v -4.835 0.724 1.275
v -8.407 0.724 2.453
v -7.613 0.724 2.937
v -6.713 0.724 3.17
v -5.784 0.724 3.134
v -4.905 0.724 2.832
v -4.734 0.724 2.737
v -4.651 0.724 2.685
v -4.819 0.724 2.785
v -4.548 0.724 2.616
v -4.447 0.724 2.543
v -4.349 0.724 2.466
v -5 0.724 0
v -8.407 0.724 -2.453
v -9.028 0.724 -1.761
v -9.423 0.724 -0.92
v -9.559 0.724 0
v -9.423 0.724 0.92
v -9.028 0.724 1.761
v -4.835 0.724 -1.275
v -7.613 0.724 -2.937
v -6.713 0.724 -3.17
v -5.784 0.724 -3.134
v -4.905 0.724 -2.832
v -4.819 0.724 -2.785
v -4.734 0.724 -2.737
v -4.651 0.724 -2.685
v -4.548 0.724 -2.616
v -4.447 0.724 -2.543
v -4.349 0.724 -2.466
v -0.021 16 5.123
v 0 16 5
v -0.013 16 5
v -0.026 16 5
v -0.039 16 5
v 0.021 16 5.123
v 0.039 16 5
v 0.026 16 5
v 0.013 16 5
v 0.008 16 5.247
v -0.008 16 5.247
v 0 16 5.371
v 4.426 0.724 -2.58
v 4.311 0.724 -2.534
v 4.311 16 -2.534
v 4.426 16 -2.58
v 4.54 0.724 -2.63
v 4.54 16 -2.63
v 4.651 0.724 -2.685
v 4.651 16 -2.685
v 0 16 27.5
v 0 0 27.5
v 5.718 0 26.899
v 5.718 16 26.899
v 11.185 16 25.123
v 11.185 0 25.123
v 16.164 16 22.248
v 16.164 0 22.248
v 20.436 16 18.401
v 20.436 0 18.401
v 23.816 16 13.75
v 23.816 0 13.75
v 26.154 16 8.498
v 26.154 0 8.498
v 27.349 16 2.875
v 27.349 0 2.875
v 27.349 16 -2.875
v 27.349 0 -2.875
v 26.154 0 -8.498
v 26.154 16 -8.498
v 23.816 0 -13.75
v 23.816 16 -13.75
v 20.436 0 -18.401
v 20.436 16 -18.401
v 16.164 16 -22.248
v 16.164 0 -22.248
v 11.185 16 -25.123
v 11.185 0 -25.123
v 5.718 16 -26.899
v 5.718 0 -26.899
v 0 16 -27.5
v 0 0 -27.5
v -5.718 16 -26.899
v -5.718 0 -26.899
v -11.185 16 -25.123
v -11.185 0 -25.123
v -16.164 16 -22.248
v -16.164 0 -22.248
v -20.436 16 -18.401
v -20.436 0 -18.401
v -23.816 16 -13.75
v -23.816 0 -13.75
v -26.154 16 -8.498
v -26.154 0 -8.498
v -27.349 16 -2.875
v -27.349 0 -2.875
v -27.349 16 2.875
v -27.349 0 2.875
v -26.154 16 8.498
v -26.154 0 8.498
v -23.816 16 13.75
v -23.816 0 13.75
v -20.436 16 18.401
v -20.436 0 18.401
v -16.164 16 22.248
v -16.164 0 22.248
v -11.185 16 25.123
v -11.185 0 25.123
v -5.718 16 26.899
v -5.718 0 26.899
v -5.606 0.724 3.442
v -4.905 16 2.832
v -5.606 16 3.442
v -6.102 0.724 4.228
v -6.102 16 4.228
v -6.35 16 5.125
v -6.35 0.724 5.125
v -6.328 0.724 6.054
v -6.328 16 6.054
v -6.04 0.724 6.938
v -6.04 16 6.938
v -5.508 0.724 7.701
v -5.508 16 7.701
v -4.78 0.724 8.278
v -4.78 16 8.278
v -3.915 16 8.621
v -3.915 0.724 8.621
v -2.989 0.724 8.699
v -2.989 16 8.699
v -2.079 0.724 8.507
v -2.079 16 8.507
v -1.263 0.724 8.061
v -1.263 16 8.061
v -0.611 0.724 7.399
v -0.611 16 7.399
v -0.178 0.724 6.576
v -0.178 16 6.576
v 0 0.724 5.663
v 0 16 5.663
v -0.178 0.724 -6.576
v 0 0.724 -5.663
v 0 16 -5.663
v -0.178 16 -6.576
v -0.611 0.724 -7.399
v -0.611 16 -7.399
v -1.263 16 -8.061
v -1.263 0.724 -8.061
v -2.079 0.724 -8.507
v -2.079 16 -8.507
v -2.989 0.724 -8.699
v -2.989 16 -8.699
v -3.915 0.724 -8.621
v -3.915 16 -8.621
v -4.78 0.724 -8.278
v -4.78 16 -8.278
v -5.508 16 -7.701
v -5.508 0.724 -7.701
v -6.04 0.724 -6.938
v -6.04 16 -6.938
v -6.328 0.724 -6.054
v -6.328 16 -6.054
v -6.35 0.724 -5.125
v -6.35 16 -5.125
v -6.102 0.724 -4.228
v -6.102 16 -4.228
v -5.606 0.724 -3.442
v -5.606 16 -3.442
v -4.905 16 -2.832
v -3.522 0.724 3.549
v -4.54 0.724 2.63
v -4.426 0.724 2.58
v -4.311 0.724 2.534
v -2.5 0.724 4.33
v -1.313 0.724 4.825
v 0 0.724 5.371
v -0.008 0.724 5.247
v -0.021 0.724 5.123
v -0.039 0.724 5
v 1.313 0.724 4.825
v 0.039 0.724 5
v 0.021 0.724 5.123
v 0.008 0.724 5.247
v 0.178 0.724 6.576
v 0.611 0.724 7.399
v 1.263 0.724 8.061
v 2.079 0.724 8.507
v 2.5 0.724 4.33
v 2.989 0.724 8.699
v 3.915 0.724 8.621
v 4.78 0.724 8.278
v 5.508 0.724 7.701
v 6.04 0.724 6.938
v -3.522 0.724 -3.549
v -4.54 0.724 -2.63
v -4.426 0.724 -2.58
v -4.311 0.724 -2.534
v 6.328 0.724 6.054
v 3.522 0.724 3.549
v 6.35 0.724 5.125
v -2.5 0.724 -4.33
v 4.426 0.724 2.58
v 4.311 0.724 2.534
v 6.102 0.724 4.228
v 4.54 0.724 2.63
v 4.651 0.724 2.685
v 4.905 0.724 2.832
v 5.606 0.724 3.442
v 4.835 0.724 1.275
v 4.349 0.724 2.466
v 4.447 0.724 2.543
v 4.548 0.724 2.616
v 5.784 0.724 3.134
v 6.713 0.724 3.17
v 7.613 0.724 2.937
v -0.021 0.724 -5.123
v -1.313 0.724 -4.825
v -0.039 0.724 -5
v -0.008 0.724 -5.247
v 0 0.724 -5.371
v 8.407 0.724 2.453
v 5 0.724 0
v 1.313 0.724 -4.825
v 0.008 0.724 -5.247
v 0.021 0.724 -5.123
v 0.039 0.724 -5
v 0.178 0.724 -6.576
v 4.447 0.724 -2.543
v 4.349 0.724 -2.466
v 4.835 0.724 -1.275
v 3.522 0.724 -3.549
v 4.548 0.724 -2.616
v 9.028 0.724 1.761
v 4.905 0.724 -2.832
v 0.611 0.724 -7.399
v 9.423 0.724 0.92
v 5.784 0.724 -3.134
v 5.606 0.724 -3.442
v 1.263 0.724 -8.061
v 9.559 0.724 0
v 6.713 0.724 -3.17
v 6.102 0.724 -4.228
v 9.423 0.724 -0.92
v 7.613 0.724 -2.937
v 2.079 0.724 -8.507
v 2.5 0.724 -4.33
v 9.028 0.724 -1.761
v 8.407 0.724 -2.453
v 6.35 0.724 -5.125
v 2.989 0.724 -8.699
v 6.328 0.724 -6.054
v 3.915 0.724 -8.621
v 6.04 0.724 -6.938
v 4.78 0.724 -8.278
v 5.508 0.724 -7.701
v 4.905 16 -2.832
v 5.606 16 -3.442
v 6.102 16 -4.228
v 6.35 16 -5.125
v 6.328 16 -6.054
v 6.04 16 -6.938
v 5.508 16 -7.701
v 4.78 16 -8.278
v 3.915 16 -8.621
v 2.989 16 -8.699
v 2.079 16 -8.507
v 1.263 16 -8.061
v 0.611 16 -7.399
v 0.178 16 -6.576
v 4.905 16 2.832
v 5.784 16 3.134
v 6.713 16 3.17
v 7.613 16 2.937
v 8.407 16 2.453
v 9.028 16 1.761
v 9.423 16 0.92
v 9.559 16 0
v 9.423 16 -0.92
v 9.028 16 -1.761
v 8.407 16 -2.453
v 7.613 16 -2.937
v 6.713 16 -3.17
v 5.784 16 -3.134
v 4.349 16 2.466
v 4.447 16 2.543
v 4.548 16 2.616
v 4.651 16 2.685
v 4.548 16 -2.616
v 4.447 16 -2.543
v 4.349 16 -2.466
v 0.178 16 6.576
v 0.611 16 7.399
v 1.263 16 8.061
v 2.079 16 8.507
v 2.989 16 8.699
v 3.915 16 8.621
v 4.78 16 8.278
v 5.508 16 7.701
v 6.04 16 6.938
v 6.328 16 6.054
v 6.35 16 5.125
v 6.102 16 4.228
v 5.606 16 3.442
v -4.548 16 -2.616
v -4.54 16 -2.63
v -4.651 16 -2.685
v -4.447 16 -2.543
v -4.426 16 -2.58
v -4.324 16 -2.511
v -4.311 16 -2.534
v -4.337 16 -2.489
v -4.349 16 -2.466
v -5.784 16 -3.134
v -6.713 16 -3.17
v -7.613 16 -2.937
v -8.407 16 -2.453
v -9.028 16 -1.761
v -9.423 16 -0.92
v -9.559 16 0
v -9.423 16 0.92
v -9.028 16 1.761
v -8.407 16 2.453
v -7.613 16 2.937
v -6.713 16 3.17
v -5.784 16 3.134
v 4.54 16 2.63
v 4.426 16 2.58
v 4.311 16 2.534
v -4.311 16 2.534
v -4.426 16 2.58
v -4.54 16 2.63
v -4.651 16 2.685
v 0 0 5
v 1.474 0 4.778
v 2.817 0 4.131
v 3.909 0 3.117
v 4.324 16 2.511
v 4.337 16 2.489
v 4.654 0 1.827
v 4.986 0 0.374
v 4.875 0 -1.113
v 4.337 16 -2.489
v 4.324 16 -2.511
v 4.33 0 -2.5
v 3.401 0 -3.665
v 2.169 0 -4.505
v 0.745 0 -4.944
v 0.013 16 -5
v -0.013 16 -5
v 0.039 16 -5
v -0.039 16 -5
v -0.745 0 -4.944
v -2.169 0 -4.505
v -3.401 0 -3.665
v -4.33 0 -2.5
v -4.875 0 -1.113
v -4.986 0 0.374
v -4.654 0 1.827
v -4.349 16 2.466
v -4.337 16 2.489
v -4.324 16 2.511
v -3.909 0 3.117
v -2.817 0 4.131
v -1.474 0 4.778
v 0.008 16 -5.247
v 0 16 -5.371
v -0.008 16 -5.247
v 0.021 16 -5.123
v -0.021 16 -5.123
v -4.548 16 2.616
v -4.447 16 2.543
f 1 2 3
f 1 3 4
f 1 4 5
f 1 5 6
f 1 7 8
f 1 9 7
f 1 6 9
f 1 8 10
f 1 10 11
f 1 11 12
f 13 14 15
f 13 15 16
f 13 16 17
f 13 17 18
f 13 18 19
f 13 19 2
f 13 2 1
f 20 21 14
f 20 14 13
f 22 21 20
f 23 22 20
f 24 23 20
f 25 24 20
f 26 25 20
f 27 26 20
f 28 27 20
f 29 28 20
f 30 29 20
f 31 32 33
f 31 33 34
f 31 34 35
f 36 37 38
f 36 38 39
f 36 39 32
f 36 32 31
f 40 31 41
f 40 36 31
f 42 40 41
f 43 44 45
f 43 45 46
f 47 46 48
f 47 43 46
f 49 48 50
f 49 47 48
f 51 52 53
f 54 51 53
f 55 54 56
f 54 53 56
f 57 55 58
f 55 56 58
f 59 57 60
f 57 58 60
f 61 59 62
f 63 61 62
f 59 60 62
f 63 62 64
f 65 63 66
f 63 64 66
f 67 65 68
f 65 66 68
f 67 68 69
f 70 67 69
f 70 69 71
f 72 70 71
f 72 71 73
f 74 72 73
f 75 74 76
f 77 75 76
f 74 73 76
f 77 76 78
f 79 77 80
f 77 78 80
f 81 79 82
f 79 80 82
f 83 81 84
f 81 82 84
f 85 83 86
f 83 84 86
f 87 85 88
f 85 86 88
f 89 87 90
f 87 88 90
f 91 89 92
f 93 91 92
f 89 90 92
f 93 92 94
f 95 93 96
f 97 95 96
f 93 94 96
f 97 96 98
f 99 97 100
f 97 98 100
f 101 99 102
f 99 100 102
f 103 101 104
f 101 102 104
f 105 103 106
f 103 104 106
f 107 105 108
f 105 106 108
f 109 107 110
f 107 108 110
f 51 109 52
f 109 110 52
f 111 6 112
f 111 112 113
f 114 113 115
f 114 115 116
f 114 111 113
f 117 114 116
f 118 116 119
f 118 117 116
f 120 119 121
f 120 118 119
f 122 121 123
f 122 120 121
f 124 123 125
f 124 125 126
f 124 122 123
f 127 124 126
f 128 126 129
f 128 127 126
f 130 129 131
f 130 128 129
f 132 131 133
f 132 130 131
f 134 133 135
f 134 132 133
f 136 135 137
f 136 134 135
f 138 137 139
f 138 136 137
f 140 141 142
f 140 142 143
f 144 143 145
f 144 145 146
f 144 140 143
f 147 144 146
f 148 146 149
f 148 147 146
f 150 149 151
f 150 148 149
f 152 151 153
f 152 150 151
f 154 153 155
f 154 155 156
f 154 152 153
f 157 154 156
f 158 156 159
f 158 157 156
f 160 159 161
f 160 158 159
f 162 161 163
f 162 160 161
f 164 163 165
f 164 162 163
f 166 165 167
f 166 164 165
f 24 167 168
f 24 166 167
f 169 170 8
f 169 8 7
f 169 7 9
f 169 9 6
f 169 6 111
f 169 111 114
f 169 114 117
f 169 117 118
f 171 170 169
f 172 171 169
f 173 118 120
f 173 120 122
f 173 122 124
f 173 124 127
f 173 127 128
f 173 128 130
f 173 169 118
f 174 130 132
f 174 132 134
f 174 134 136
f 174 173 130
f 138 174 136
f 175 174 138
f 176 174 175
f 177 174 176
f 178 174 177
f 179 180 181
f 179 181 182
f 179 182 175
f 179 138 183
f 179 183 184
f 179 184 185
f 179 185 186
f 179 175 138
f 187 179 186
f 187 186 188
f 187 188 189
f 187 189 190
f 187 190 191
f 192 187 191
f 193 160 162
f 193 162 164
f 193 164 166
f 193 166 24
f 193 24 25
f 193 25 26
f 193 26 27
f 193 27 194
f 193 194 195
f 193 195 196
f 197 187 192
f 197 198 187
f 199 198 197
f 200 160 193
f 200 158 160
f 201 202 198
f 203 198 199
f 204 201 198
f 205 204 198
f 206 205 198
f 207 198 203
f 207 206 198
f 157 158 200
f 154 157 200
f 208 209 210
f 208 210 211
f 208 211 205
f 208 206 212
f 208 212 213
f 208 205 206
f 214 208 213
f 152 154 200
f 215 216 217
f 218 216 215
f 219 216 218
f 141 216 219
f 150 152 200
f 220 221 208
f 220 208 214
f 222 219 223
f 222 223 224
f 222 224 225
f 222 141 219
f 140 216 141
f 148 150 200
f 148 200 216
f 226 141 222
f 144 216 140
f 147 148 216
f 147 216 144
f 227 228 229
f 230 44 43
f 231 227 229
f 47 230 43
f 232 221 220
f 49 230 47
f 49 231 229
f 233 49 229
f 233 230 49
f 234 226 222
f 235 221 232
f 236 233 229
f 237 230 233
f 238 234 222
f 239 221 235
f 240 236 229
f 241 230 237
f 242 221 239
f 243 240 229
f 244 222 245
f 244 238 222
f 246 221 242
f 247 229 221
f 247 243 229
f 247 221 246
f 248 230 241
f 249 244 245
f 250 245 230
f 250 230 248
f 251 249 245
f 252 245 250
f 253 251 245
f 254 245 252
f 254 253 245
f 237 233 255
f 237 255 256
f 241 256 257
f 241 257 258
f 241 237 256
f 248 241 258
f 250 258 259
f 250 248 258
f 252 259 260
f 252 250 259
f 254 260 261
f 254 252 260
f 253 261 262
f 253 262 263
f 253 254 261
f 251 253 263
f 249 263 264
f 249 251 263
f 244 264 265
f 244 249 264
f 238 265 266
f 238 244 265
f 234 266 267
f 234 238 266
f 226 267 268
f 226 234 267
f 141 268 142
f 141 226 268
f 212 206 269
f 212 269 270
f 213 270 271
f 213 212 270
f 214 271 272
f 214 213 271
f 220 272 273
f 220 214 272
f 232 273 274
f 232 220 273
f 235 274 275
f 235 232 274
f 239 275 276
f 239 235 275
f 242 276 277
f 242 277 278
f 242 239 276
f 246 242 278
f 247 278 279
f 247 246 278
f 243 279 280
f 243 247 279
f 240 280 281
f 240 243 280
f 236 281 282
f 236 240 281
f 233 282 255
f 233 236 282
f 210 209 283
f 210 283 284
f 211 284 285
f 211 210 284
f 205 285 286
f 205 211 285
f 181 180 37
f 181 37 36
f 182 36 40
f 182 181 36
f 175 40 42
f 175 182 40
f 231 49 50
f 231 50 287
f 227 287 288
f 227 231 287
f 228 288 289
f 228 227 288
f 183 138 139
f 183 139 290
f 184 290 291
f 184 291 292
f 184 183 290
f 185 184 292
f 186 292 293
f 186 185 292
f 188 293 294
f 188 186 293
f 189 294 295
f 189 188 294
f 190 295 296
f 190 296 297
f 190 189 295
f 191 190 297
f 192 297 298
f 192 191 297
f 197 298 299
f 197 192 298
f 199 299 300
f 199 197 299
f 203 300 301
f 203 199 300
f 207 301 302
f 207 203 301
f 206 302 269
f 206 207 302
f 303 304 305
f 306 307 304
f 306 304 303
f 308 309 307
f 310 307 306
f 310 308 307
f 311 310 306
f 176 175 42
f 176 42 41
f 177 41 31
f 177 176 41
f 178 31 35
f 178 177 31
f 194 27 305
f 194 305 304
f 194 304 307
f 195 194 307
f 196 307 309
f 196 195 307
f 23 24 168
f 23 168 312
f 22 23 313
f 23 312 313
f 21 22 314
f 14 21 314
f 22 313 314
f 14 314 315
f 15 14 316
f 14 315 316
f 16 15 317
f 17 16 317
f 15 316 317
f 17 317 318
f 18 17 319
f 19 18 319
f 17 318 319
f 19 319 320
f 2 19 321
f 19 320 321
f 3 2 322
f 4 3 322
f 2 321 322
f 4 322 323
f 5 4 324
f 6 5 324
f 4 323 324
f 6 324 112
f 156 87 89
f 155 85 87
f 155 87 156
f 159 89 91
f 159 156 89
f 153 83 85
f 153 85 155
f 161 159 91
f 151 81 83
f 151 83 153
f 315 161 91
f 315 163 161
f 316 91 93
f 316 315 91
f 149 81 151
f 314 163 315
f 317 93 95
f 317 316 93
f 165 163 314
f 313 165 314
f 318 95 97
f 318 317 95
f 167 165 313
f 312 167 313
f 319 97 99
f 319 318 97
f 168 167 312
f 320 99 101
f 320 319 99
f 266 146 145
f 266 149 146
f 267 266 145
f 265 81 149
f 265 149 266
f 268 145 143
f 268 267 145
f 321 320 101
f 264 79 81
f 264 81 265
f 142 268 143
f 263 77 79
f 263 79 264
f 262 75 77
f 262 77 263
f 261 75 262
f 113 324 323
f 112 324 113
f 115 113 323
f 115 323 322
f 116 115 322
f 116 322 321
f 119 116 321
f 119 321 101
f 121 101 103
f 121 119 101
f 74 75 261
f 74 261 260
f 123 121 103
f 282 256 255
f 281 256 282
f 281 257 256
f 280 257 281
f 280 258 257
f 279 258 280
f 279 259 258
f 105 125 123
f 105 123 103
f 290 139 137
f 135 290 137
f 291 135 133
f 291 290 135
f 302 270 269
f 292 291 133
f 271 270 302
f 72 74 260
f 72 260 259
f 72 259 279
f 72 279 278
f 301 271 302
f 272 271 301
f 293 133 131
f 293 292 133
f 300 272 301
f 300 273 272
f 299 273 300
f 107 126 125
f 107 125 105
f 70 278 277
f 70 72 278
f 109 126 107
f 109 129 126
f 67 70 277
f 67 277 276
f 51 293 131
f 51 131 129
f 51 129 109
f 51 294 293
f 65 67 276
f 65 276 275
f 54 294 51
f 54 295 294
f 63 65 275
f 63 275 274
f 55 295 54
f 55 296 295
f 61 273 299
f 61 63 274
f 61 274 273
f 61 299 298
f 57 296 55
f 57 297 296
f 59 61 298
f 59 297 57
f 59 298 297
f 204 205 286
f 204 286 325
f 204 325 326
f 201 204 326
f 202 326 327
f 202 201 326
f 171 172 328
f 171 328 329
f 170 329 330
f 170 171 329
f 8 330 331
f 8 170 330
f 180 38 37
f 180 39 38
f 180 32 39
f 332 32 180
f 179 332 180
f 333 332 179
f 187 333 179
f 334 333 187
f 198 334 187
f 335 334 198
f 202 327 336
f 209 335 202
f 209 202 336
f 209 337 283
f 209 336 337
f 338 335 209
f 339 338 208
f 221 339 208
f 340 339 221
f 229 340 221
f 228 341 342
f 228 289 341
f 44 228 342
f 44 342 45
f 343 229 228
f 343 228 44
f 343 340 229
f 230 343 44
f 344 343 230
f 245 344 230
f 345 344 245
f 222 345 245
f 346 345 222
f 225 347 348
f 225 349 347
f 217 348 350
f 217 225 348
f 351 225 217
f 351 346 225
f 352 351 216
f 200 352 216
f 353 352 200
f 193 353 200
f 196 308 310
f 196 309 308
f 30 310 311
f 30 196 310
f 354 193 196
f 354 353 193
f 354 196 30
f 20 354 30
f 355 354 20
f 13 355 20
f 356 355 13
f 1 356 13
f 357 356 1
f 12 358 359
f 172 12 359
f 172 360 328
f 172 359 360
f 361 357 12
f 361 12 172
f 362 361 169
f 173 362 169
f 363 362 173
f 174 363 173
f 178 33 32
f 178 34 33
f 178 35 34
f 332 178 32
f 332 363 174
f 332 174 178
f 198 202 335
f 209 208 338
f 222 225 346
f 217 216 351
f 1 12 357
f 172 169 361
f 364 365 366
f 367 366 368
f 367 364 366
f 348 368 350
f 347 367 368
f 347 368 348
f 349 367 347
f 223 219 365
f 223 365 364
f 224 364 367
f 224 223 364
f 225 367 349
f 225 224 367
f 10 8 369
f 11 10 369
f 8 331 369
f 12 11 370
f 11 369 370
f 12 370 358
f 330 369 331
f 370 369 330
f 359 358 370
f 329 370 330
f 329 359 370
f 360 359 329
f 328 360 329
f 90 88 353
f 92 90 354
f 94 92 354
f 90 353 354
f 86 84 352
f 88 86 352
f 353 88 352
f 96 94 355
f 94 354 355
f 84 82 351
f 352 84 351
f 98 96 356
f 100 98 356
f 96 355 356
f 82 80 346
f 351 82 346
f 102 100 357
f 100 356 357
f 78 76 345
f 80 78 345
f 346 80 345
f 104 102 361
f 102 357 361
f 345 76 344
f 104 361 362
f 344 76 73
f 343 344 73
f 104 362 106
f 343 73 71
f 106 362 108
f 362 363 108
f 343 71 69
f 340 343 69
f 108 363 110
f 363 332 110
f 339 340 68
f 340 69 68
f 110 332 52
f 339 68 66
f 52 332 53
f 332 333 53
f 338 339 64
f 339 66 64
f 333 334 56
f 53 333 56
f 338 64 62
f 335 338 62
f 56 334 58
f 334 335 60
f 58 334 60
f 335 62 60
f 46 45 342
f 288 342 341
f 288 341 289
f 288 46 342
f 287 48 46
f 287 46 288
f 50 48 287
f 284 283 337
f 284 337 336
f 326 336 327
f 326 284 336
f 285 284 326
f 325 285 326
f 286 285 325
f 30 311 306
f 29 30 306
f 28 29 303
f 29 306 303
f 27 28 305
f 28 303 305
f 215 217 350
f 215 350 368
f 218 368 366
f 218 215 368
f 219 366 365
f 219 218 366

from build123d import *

# Parameters (mm, degrees)
SKETCH1_R           = 27.5
BOSS_EXTRUDE1_DEPTH = 16
SKETCH2_R           = 5
CUT_EXTRUDE1_DEPTH  = 43.053537307
SKETCH3_R           = 3.188575247
CUT_EXTRUDE2_DEPTH  = 15.2756379
CIRPATTERN1_COUNT   = 6


with BuildPart() as part:
    # Sketch1 → Boss-Extrude1 (new body)
    with BuildSketch(Plane(origin=(0, 0, 0), x_dir=(1, 0, 0), z_dir=(0, 1, 0))):
        Circle(SKETCH1_R)
    extrude(amount=BOSS_EXTRUDE1_DEPTH)

    # Sketch2 → Cut-Extrude1 (cut, through all)
    with BuildSketch(Plane(origin=(0, 0, 0), x_dir=(1, 0, 0), z_dir=(0, 1, 0))):
        Circle(SKETCH2_R)
    extrude(amount=CUT_EXTRUDE1_DEPTH, mode=Mode.SUBTRACT)

    # Sketch3 → Cut-Extrude2 (cut)
    with BuildSketch(Plane(origin=(0, 16, 0), x_dir=(1, 0, 0), z_dir=(0, 1, 0))):
        with Locations((-6.370430977, 0)):
            Circle(SKETCH3_R)
    cut_extrude2 = extrude(amount=-CUT_EXTRUDE2_DEPTH, mode=Mode.SUBTRACT)

    # CirPattern1: Cut-Extrude2 ×6 about axis
    cirpattern1_axis = Axis((0, 0, 0), (0, 1, 0))
    for i in range(1, CIRPATTERN1_COUNT):
        add(cut_extrude2.rotate(cirpattern1_axis, i * 360 / CIRPATTERN1_COUNT), mode=Mode.SUBTRACT)


solid = part.part
